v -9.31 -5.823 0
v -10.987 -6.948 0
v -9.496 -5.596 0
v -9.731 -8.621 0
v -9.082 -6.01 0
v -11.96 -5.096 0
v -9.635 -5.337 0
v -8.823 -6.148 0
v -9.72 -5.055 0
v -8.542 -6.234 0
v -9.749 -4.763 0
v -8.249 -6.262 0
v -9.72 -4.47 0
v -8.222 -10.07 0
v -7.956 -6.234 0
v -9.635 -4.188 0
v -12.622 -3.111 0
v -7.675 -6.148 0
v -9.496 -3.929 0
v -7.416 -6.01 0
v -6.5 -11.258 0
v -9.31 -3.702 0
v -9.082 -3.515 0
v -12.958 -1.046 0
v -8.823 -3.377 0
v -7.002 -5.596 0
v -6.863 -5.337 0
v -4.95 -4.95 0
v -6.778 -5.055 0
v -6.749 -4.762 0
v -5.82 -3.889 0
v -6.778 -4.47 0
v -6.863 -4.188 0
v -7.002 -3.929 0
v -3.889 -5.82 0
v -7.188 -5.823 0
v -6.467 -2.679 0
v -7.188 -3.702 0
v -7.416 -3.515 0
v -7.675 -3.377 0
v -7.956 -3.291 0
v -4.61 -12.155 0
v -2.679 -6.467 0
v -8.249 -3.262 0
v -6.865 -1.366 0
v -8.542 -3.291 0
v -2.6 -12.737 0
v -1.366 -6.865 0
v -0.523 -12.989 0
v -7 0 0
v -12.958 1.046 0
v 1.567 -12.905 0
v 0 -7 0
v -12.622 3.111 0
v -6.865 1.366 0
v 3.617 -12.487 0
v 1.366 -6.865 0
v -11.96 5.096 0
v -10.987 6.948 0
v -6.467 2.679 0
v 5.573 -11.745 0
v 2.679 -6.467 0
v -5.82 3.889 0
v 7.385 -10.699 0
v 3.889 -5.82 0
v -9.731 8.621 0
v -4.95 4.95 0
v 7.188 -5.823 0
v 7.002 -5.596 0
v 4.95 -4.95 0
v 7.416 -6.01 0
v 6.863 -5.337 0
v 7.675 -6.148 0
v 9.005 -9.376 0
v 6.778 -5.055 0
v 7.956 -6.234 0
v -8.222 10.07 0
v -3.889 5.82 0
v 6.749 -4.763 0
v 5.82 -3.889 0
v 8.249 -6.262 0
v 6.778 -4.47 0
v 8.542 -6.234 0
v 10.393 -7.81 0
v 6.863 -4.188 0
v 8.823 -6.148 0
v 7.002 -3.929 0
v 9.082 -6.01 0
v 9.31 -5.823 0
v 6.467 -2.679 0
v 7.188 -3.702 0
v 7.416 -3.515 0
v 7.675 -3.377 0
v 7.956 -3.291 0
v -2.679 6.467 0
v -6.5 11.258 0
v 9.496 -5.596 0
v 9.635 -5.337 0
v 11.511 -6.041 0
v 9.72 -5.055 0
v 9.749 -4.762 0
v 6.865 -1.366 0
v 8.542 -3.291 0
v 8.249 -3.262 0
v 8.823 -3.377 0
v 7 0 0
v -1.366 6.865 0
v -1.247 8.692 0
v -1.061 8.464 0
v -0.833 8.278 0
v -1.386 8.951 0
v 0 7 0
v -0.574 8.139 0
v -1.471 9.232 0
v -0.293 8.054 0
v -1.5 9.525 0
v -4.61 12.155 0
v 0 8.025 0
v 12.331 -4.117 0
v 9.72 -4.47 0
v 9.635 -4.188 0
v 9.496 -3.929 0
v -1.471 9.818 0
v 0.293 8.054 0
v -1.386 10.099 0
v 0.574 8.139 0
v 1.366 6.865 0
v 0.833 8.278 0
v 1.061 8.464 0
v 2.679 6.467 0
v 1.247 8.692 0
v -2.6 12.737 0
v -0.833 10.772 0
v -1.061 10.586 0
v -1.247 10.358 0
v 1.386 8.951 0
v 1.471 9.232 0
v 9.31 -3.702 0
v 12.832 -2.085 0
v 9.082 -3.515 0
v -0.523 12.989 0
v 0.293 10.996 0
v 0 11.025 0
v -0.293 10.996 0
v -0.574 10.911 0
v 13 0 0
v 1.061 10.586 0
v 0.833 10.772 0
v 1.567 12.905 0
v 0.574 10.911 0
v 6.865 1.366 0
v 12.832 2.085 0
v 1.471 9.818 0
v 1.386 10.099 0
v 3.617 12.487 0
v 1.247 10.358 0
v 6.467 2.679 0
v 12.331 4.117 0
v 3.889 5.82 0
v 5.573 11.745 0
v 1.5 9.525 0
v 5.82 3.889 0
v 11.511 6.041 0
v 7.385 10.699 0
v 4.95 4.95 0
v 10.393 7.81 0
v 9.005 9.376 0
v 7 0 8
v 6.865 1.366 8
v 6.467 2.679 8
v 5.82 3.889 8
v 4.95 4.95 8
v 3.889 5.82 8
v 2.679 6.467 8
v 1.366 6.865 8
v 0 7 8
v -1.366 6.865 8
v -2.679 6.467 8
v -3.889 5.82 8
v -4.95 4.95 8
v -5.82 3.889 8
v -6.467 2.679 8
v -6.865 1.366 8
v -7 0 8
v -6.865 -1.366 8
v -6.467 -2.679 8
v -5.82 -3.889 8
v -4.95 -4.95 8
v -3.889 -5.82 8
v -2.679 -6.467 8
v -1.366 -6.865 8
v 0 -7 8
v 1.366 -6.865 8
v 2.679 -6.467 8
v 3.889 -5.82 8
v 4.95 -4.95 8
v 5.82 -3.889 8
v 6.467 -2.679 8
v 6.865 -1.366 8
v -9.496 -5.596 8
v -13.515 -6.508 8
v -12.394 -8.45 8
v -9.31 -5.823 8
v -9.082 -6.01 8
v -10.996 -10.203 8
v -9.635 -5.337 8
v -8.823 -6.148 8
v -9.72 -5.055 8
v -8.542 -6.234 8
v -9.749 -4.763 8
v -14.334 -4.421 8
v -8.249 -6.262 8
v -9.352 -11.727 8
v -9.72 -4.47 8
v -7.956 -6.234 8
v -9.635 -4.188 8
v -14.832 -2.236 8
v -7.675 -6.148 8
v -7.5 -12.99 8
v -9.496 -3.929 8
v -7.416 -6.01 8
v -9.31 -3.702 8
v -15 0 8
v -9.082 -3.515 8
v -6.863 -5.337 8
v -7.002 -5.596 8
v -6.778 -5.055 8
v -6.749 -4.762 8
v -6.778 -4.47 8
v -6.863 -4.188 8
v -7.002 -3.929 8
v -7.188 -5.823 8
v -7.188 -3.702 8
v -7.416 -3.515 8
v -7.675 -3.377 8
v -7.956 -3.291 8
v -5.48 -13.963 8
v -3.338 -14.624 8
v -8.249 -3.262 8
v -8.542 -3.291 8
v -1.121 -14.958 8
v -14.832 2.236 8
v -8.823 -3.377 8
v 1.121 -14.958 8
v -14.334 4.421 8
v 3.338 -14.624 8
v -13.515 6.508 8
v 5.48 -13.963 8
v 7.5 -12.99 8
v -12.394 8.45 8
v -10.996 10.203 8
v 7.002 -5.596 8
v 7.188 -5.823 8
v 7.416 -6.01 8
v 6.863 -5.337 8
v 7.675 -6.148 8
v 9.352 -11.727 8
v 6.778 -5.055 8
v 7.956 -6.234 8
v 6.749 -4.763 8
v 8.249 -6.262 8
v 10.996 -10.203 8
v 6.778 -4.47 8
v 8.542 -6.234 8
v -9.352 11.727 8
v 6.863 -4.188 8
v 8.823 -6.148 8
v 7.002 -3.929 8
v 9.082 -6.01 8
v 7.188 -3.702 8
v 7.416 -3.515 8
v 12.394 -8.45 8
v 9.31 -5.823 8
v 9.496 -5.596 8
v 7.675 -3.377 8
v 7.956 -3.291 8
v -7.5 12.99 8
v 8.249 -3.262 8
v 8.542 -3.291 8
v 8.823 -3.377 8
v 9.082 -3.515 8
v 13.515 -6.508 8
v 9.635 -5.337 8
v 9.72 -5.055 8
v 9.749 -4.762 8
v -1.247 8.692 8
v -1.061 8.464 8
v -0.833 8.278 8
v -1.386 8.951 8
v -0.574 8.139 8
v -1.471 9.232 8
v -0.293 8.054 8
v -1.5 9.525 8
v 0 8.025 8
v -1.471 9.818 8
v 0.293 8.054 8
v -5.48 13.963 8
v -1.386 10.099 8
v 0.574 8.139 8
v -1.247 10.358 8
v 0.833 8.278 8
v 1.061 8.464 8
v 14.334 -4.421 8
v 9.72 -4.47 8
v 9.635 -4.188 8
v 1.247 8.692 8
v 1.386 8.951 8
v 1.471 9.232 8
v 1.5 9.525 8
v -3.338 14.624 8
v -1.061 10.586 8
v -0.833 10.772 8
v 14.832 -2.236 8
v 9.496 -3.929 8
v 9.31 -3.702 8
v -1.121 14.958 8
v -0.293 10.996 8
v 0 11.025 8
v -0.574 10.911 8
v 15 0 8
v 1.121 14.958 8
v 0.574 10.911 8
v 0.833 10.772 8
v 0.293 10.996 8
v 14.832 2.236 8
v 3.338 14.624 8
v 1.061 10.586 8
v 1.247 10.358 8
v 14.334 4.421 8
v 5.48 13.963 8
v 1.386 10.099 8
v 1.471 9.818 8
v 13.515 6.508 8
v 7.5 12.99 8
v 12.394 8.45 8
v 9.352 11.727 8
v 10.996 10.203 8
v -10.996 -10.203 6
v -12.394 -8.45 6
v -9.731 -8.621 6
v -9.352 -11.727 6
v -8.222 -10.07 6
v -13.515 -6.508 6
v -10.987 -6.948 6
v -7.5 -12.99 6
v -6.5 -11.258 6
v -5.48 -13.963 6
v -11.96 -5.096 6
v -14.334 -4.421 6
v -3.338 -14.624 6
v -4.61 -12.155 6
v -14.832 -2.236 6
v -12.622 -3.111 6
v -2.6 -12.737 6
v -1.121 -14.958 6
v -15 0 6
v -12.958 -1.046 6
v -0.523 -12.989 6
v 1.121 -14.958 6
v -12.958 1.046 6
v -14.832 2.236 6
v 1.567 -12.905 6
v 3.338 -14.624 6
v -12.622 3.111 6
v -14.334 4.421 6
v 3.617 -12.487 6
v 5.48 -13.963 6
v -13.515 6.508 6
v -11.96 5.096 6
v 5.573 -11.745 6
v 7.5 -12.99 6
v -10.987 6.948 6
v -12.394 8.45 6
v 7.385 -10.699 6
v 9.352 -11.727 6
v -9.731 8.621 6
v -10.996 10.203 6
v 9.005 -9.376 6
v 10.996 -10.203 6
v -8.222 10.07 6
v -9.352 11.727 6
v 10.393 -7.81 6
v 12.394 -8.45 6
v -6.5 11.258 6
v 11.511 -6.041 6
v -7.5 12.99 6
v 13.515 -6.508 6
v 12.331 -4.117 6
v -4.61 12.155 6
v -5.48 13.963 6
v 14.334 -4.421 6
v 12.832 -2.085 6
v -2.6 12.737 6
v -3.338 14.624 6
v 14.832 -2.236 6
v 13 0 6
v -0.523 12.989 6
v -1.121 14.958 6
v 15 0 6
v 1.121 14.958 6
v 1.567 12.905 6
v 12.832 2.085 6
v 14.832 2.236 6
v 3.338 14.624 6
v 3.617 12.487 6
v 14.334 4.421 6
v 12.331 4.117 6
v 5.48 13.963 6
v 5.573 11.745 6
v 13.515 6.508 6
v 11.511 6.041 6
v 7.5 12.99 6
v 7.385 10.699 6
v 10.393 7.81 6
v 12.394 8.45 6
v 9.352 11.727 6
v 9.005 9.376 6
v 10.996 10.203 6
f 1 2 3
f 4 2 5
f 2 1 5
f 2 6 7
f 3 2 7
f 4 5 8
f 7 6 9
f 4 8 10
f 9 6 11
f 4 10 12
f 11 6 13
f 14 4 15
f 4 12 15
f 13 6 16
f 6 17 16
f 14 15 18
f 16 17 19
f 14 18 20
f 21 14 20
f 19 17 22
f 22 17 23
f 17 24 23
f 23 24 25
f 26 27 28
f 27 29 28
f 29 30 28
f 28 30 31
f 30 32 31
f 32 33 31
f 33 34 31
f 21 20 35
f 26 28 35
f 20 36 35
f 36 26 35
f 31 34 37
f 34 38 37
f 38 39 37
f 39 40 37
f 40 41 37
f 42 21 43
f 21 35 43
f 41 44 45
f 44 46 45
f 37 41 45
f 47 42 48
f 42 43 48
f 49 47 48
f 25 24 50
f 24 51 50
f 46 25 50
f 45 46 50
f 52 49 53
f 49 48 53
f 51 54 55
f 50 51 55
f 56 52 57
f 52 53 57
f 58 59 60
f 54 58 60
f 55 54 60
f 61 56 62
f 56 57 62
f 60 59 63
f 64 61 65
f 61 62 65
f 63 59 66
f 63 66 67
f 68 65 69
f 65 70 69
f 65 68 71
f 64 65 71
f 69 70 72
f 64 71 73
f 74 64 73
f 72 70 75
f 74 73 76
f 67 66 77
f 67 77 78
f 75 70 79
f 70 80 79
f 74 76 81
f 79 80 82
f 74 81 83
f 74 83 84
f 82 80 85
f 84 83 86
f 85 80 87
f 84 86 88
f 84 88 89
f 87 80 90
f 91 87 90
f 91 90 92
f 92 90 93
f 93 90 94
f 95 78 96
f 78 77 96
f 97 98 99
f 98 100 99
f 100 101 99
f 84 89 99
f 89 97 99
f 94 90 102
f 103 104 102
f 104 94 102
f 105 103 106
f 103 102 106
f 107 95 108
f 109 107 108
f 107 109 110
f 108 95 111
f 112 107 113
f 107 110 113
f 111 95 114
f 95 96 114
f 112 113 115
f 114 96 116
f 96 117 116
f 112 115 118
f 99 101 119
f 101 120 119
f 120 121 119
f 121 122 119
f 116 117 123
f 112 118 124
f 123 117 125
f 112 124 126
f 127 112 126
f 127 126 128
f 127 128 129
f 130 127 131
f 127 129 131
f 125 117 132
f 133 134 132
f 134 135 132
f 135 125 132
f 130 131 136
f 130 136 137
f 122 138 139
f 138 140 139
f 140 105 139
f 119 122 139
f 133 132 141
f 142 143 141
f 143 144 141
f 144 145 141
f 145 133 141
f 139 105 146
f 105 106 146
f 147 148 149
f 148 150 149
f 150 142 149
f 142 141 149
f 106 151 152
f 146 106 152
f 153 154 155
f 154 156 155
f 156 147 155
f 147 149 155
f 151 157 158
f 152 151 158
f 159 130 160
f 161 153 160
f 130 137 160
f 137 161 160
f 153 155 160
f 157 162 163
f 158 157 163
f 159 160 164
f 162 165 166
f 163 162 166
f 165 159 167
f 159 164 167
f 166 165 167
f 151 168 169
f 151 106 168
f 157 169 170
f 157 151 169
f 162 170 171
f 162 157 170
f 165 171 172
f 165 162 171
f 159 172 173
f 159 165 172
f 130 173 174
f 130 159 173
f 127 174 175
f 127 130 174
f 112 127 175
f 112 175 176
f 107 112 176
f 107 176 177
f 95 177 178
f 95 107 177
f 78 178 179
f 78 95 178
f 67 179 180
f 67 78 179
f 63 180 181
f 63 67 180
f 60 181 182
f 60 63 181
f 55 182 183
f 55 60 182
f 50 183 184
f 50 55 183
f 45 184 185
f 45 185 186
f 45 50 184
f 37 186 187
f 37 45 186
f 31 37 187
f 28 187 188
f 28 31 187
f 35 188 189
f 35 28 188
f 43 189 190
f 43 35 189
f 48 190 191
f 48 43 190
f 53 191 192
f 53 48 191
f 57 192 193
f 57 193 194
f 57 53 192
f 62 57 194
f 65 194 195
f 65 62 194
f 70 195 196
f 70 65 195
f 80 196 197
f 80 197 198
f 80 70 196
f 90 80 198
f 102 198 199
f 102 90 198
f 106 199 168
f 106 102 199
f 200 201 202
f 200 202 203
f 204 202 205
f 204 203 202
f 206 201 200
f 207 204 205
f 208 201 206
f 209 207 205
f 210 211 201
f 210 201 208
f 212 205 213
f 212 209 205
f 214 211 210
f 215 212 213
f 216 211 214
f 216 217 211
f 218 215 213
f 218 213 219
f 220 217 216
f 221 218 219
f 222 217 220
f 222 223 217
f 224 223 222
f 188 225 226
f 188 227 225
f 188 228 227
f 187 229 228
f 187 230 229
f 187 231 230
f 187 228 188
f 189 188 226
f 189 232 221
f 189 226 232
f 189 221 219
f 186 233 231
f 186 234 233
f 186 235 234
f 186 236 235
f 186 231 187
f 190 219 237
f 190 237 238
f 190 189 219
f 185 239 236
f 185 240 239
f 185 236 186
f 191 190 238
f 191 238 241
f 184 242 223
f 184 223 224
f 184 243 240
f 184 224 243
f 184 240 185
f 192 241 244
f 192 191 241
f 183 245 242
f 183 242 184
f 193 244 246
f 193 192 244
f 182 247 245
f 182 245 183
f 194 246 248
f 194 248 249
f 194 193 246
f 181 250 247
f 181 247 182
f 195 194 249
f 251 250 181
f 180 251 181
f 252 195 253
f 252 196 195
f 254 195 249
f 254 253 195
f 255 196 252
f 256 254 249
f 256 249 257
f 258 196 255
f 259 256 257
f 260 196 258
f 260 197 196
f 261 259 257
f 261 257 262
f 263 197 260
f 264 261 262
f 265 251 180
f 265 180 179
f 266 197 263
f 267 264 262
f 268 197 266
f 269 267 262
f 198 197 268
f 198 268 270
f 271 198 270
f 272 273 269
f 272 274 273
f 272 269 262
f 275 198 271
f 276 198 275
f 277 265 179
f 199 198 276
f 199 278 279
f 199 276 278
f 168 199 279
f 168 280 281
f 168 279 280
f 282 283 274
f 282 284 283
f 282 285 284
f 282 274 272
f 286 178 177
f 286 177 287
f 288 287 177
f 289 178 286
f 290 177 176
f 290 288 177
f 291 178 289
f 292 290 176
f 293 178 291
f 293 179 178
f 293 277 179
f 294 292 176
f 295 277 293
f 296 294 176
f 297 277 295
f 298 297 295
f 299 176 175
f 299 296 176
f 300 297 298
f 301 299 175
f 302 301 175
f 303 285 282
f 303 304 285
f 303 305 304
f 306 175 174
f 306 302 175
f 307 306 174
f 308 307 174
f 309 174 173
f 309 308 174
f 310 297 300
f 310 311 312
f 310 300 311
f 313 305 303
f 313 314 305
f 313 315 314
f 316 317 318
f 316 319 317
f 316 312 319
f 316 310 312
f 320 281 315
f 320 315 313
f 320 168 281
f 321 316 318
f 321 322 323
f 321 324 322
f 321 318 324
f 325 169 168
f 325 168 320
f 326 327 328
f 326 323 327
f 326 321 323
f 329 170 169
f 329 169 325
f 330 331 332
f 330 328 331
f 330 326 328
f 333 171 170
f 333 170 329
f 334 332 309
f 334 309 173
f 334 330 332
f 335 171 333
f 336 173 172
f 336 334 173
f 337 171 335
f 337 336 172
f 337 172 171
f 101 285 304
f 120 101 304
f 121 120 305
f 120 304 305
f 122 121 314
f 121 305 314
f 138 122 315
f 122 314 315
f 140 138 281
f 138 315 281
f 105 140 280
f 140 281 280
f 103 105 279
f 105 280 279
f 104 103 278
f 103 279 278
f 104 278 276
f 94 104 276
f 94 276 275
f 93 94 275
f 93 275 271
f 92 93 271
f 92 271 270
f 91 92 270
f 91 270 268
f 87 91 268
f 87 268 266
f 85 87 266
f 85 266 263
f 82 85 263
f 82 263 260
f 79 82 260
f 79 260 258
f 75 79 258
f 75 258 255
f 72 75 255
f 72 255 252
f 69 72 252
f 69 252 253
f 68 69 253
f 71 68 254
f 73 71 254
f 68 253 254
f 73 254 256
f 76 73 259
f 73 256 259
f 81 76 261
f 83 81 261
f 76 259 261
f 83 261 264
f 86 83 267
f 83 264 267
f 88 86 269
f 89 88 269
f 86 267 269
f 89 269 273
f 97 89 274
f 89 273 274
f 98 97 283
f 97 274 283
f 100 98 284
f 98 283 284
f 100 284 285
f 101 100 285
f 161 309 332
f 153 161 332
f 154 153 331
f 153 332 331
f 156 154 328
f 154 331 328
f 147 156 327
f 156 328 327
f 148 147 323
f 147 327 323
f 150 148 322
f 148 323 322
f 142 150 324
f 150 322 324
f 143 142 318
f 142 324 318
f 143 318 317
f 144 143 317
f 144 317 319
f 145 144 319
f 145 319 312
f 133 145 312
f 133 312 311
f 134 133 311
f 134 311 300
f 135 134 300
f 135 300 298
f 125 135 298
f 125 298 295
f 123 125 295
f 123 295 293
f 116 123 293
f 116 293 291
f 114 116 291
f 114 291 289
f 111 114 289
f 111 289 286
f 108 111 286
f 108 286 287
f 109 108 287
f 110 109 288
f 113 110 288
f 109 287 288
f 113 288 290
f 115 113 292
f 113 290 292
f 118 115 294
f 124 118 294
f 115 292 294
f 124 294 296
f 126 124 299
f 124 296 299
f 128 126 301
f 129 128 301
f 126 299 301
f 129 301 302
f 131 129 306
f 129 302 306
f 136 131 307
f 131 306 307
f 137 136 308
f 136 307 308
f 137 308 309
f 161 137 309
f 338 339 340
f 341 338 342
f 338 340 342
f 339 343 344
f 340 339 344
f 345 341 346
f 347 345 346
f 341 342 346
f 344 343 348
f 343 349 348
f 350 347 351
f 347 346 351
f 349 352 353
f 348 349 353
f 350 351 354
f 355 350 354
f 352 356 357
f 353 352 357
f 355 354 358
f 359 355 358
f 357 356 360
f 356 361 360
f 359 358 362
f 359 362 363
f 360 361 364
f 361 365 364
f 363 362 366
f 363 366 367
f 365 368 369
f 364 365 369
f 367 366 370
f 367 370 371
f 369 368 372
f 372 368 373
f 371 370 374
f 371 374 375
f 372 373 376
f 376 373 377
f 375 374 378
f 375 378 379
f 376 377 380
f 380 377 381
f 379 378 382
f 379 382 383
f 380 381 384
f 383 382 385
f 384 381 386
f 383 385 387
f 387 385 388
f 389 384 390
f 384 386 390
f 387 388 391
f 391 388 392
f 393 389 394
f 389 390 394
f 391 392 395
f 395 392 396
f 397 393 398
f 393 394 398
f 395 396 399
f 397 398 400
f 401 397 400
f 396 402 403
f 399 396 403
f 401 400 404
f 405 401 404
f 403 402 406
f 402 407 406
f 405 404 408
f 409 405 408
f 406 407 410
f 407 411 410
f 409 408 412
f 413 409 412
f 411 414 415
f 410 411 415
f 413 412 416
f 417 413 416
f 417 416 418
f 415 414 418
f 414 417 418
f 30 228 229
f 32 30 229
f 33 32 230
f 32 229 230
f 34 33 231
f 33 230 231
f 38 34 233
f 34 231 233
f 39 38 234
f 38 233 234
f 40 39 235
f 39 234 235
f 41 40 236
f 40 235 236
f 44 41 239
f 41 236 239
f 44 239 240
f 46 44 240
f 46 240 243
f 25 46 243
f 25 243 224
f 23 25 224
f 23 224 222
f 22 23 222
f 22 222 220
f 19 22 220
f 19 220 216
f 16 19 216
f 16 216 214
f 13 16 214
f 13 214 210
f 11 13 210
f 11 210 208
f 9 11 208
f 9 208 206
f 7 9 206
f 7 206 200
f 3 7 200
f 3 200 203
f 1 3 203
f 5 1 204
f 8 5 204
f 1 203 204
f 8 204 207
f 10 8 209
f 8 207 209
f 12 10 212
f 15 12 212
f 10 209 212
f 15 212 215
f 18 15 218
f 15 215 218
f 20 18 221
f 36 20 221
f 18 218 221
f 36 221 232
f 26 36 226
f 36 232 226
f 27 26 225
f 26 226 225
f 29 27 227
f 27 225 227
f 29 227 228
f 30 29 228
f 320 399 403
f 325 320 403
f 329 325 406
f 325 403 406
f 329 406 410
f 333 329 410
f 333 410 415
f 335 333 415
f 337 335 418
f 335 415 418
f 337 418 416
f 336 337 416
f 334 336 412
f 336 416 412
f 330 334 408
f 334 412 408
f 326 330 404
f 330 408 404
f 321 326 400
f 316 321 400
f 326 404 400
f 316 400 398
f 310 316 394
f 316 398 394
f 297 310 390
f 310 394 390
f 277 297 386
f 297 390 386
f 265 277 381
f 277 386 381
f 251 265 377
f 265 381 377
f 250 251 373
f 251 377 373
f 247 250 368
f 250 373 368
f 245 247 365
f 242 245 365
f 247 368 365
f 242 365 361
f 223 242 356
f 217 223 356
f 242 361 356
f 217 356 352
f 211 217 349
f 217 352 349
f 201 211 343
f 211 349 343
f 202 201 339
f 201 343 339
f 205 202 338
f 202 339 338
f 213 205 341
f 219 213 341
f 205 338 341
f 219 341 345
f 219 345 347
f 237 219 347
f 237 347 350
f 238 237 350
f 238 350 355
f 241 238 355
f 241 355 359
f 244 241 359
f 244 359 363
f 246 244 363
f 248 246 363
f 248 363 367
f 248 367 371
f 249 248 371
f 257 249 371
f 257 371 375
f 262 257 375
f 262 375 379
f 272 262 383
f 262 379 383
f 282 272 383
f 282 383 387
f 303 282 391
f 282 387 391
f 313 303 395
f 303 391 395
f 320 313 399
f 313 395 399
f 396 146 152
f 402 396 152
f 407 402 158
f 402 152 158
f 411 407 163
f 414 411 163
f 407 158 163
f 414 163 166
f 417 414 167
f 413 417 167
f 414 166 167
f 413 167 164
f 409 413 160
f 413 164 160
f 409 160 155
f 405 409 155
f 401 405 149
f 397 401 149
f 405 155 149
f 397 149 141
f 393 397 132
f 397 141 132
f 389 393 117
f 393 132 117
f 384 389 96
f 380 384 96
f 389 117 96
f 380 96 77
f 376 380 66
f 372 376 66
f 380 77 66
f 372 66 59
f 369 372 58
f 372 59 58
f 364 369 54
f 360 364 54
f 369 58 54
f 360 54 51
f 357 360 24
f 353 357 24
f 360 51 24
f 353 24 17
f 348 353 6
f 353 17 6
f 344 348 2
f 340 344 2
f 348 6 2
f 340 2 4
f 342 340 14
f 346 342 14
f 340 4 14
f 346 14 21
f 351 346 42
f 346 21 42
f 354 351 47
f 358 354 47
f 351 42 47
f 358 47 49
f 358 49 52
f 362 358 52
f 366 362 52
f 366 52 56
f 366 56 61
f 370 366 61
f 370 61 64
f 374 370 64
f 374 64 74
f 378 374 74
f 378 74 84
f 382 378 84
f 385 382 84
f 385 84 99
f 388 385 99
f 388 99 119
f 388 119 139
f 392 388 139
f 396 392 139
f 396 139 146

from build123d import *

# Parameters (mm, degrees)
SKETCH1_R           = 13
SKETCH1_R_2         = 7
BOSS_EXTRUDE1_DEPTH = 6
SKETCH2_R           = 15
SKETCH2_R_2         = 7
BOSS_EXTRUDE2_DEPTH = 2
SKETCH3_R           = 1.5
CUT_EXTRUDE1_DEPTH  = 16


with BuildPart() as part:
    # Sketch1 → Boss-Extrude1 (new body)
    with BuildSketch(Plane.XY):
        Circle(SKETCH1_R)
        Circle(SKETCH1_R_2, mode=Mode.SUBTRACT)
    extrude(amount=BOSS_EXTRUDE1_DEPTH)

    # Sketch2 → Boss-Extrude2 (add)
    with BuildSketch(Plane.XY.offset(6)):
        Circle(SKETCH2_R)
        Circle(SKETCH2_R_2, mode=Mode.SUBTRACT)
    extrude(amount=BOSS_EXTRUDE2_DEPTH)

    # Sketch3 → Cut-Extrude1 (cut)
    with BuildSketch(Plane.XY.offset(8)):
        with Locations((0, 9.525)):
            Circle(SKETCH3_R)
        with Locations((8.248891971, -4.7625)):
            Circle(SKETCH3_R)
        with Locations((-8.248891971, -4.7625)):
            Circle(SKETCH3_R)
    extrude(amount=-CUT_EXTRUDE1_DEPTH, mode=Mode.SUBTRACT)


solid = part.part
